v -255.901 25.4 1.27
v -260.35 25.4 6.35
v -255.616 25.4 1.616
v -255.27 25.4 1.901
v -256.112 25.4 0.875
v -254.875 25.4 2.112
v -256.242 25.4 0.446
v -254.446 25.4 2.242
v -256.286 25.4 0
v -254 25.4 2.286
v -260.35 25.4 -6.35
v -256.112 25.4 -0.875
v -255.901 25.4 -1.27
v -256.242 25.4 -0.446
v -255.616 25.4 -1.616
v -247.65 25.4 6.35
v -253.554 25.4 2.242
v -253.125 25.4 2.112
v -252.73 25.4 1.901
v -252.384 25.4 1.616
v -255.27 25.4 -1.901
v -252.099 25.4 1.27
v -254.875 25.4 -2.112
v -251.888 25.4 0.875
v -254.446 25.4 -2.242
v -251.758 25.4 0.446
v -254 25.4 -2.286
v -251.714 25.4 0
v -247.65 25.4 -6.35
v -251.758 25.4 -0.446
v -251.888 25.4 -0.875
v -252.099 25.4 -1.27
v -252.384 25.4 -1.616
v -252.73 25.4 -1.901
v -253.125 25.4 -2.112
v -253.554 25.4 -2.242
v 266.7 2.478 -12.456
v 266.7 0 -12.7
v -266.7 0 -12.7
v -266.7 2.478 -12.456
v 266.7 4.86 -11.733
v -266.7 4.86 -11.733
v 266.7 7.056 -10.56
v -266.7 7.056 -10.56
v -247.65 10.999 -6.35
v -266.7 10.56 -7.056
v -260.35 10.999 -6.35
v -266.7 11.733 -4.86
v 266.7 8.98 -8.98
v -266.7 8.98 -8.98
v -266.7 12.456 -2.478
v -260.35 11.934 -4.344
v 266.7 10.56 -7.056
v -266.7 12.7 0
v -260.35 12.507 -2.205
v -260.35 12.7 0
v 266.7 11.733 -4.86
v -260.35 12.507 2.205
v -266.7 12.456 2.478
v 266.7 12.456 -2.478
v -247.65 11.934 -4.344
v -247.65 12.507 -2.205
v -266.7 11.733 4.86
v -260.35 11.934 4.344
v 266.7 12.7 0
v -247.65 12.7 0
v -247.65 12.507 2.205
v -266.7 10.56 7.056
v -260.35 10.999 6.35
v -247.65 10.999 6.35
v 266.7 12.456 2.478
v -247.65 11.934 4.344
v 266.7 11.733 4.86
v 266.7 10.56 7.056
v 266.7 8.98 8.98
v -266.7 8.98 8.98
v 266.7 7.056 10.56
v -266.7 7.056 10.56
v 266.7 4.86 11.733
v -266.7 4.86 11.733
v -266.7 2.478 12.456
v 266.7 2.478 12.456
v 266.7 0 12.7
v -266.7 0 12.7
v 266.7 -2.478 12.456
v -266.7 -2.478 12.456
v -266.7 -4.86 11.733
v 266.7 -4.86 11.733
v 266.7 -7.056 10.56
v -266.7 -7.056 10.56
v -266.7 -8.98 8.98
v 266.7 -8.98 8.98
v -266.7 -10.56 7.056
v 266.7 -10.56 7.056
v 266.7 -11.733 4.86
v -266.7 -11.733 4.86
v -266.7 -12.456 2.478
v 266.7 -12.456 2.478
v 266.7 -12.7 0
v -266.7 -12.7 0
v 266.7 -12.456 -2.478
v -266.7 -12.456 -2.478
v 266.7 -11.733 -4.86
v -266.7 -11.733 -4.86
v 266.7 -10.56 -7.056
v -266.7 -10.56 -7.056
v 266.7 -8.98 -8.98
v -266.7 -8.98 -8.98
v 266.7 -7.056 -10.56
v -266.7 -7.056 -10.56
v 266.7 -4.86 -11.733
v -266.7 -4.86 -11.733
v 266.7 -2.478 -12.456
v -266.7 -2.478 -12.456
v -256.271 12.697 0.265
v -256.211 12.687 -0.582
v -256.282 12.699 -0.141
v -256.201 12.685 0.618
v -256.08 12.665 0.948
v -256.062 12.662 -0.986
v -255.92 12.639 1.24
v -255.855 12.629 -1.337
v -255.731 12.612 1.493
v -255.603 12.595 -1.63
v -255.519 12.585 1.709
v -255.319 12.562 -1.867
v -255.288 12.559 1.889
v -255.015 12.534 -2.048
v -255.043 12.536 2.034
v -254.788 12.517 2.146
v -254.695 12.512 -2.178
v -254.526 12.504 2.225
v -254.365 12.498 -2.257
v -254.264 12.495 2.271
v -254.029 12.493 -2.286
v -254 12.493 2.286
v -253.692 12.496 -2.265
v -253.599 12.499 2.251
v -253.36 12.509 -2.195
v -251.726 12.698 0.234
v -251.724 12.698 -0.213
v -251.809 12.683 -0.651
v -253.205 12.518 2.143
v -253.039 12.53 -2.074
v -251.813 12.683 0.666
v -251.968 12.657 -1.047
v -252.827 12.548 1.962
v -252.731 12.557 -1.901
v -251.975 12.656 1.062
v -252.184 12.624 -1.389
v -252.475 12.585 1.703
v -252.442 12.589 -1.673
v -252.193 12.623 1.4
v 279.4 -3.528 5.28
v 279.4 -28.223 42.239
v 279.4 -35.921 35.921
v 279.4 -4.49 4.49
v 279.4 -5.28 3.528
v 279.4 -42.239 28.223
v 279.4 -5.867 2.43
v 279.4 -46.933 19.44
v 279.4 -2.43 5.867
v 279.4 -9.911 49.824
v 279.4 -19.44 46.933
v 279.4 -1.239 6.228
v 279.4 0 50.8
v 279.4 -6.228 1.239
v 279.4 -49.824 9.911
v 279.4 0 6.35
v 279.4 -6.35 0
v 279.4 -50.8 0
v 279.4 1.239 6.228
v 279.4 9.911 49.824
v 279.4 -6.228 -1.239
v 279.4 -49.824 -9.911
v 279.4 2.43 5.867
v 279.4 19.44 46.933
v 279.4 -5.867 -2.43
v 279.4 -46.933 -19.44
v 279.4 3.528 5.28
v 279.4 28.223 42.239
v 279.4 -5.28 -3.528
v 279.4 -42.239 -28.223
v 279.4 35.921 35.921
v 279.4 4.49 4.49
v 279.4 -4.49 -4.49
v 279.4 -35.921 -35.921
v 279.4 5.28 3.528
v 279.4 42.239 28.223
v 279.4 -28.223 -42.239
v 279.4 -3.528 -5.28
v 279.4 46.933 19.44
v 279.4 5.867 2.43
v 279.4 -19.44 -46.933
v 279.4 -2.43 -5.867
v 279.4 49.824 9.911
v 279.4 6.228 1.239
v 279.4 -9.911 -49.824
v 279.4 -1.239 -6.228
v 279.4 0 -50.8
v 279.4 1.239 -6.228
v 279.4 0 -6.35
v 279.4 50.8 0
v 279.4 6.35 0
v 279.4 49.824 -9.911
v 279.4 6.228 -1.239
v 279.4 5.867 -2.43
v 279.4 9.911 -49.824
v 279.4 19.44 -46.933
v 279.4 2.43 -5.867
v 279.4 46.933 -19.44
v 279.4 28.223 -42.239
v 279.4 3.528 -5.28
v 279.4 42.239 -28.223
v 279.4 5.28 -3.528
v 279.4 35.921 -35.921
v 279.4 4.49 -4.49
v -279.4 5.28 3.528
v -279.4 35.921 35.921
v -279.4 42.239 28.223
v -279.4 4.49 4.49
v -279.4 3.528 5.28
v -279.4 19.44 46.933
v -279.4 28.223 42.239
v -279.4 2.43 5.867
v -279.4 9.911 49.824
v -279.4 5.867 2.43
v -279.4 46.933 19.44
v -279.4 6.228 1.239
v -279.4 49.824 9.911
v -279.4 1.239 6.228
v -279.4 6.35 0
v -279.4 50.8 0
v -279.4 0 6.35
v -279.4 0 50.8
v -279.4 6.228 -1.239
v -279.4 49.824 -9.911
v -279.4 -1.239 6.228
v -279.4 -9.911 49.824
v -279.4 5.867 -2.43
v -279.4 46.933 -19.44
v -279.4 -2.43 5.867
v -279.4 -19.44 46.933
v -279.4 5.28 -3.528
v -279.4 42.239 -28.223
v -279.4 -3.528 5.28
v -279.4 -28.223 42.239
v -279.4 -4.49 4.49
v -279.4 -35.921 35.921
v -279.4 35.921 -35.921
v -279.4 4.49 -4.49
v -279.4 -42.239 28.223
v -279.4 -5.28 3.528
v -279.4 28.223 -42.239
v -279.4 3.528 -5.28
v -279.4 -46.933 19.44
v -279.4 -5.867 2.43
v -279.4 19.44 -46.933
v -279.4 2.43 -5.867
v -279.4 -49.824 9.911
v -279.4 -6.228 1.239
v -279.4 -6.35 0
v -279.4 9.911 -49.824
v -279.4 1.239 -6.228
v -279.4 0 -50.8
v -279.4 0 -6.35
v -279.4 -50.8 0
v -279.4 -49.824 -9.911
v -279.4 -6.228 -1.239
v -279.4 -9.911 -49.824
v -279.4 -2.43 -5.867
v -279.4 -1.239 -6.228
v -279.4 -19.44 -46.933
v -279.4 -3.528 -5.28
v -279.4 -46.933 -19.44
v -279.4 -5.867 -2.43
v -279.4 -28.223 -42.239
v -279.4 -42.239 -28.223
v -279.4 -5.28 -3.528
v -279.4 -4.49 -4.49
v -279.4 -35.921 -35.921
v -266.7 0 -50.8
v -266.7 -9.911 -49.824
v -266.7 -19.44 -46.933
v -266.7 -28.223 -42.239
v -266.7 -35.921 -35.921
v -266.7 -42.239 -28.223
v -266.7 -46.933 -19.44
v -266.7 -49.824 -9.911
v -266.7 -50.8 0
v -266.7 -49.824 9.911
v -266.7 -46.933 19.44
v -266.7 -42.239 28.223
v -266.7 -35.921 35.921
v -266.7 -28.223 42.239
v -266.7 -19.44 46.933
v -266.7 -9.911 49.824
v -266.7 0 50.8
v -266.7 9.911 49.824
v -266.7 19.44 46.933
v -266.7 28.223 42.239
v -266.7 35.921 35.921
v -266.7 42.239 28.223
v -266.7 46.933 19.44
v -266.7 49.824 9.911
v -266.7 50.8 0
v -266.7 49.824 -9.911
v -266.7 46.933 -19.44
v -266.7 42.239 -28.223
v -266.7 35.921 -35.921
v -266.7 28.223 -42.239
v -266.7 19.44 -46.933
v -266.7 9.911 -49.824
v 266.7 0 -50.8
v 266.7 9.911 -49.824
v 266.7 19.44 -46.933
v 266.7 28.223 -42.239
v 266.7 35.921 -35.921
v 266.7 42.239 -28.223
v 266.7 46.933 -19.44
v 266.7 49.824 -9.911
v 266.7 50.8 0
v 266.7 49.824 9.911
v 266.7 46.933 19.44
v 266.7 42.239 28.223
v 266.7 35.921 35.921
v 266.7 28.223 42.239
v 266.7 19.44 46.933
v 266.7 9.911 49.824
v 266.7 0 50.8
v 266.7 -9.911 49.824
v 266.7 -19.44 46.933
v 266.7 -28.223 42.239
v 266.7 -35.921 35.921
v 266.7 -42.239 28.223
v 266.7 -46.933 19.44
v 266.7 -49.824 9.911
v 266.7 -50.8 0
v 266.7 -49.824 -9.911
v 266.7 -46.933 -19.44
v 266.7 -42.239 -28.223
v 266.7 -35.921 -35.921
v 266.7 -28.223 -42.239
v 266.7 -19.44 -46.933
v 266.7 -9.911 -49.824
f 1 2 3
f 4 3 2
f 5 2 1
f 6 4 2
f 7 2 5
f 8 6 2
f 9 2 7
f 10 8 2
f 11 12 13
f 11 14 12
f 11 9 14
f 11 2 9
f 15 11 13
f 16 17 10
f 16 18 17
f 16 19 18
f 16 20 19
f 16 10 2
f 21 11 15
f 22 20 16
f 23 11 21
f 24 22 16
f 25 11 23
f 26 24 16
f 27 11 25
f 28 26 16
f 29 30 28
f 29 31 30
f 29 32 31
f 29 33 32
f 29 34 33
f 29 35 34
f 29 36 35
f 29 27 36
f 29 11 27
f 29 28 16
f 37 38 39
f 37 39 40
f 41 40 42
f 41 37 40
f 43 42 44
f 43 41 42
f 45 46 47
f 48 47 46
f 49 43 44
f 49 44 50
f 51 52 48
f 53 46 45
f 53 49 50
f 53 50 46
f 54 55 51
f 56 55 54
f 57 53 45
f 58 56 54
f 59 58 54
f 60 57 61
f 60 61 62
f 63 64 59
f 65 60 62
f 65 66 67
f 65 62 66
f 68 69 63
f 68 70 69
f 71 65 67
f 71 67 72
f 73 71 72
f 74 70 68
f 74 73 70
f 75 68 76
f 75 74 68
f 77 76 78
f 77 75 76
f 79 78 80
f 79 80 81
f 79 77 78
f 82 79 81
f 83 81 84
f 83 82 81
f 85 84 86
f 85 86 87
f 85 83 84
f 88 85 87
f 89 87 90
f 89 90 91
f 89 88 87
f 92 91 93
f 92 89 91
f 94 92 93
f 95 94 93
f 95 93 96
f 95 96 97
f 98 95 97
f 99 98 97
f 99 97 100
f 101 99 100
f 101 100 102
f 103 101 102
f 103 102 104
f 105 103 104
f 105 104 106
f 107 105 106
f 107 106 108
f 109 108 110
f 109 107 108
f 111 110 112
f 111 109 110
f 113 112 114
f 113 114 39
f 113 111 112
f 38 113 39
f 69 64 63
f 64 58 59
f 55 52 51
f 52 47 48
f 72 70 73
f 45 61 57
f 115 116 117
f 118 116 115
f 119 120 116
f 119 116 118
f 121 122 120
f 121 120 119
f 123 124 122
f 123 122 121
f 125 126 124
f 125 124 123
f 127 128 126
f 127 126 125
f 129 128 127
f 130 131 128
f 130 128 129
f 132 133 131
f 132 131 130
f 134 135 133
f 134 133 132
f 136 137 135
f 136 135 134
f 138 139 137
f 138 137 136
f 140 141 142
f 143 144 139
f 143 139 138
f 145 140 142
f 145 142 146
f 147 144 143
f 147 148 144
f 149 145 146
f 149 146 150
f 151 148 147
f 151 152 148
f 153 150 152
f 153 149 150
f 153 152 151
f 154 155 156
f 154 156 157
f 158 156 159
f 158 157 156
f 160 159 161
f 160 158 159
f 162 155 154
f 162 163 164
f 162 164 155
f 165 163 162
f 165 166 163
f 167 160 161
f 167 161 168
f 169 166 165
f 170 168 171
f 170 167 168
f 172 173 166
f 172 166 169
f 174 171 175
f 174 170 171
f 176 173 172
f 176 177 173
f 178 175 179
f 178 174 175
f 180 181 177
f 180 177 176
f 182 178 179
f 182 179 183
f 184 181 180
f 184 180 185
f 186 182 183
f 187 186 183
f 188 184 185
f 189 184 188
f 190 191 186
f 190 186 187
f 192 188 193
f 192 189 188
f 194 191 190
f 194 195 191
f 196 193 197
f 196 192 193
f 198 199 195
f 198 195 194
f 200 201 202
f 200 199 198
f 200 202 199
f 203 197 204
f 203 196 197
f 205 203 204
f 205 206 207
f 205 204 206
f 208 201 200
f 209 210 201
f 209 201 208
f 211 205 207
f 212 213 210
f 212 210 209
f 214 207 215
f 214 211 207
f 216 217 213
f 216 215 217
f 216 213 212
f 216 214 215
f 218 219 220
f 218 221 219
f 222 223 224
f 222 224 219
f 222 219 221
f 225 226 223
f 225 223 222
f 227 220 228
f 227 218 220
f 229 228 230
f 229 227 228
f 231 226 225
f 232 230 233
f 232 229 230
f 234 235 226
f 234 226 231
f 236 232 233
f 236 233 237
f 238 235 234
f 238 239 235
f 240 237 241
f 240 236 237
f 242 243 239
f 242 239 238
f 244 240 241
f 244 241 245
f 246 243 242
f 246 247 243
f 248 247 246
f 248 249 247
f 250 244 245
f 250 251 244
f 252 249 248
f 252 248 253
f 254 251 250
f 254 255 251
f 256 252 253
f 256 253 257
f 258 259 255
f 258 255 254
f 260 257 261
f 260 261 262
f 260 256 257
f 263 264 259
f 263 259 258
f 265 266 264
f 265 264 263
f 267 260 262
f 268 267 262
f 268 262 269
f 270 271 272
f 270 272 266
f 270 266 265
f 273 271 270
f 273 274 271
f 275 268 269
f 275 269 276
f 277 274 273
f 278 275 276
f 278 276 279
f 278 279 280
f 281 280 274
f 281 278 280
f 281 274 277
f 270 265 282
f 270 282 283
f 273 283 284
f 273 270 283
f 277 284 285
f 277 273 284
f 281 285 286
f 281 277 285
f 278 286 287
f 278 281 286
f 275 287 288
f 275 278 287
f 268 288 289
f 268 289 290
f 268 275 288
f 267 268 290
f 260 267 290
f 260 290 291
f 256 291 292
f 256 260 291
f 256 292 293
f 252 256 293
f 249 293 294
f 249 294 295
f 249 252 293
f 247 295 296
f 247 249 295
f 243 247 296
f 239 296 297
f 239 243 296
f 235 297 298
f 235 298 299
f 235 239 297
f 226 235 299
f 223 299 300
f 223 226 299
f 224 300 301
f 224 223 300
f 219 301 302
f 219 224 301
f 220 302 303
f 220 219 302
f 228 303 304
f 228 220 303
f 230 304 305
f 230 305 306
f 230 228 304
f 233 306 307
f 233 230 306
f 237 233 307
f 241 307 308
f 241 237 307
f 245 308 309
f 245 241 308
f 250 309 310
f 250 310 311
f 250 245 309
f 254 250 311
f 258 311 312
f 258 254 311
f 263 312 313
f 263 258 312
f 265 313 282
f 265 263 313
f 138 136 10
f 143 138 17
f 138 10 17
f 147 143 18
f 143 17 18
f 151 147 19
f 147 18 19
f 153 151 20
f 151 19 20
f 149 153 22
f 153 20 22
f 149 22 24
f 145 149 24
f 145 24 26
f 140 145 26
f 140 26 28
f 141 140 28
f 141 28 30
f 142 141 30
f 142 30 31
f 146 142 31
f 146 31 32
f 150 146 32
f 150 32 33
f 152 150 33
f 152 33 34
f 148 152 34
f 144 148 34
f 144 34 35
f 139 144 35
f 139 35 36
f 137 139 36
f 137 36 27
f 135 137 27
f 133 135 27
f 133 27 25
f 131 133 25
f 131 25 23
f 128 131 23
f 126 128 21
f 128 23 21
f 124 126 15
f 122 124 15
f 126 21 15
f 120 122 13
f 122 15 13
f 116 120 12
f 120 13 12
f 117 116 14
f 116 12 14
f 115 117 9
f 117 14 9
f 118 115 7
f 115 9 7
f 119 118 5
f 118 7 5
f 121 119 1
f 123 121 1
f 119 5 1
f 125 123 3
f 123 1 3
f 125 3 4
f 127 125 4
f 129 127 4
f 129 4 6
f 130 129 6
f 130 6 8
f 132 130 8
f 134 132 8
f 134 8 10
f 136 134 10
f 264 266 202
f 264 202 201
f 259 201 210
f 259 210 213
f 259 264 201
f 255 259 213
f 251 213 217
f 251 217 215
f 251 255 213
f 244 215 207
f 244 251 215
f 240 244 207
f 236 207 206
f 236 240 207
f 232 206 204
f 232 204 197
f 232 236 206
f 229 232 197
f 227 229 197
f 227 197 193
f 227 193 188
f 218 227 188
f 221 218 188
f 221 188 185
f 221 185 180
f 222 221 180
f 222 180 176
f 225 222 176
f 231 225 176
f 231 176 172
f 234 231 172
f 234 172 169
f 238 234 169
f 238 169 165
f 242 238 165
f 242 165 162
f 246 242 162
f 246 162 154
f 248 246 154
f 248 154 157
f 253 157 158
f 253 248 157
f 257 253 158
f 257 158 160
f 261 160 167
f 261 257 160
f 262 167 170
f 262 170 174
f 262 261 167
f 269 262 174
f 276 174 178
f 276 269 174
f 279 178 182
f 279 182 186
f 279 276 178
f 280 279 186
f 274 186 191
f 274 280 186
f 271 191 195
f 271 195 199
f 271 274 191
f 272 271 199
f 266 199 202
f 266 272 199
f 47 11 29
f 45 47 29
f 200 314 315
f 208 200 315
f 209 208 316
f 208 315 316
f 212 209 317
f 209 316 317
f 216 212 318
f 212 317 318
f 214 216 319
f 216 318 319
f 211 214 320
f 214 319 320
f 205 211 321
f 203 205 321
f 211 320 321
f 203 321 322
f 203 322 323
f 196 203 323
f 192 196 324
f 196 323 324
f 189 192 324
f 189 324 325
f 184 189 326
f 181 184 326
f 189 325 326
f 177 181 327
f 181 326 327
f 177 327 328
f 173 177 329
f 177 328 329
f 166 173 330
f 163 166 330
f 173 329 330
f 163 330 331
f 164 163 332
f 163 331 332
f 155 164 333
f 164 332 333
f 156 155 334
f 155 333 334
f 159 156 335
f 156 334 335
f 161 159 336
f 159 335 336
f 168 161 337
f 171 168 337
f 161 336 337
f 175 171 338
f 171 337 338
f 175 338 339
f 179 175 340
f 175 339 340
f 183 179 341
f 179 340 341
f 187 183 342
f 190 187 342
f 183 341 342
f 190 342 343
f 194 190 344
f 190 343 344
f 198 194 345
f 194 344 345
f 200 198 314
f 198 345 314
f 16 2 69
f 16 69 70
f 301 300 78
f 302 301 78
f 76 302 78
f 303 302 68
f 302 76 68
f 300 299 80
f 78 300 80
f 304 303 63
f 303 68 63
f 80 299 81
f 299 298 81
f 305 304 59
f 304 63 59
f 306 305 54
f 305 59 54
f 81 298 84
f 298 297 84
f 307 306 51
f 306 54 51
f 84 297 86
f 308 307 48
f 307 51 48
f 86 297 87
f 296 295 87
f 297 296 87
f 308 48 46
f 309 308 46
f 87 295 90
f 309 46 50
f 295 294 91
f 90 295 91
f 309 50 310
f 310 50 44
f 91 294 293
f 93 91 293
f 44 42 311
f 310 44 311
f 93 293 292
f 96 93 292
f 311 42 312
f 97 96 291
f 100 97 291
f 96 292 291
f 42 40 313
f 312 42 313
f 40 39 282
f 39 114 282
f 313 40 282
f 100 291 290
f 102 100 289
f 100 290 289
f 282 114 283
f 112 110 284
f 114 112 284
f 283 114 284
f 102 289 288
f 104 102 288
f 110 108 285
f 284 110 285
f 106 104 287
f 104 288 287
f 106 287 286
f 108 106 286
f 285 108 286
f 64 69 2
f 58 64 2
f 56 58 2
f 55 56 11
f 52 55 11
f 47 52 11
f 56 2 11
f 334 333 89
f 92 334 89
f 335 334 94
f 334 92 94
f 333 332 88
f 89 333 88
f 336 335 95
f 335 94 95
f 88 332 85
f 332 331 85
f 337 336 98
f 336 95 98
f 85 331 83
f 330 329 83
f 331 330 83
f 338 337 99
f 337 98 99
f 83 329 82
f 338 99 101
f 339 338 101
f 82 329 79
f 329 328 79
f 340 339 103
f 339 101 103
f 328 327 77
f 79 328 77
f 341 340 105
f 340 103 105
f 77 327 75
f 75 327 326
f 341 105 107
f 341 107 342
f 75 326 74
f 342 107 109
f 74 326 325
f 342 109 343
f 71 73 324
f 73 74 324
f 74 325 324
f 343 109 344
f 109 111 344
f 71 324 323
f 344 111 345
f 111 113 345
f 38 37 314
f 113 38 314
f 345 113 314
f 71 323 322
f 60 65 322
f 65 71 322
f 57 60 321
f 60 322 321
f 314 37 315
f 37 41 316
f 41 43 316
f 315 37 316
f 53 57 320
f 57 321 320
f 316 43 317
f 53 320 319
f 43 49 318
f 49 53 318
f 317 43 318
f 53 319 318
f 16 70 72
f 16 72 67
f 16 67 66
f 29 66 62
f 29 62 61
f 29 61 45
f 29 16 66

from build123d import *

# Parameters (mm, degrees)
SKETCH1_R                = 12.7
SKETCH1_R_2              = 6.35
BOSS_EXTRUDE1_DEPTH      = 279.4
BOSS_EXTRUDE2_START      = -12.7
SKETCH2_R                = 50.8
SKETCH2_R_2              = 6.35
BOSS_EXTRUDE2_DEPTH      = 12.7
SKETCH3_R                = 50.8
SKETCH3_R_2              = 6.35
BOSS_EXTRUDE3_DEPTH      = 12.7
BOSS_EXTRUDE4_REACH      = 315.889
BOSS_EXTRUDE4_END_RADIUS = 12.7
BOSS_EXTRUDE4_START      = 25.4
SKETCH4_W                = 12.7
SKETCH4_H                = 12.7
SKETCH4_R                = 2.286


with BuildPart() as part:
    # Sketch1 → Boss-Extrude1 (new, symmetric)
    with BuildSketch(Plane(origin=(0, 0, 0), x_dir=(0, 0, -1), z_dir=(1, 0, 0))):
        Circle(SKETCH1_R)
        Circle(SKETCH1_R_2, mode=Mode.SUBTRACT)
    extrude(amount=BOSS_EXTRUDE1_DEPTH, both=True)

    # Sketch2 → Boss-Extrude2 (add)
    with BuildSketch(Plane(origin=(279.4, 0, 0), x_dir=(0, 0, -1), z_dir=(1, 0, 0)).offset(BOSS_EXTRUDE2_START)):
        Circle(SKETCH2_R)
        Circle(SKETCH2_R_2, mode=Mode.SUBTRACT)
    extrude(amount=BOSS_EXTRUDE2_DEPTH)

    # Sketch3 → Boss-Extrude3 (add)
    with BuildSketch(Plane.ZY.offset(279.4)):
        with Locations(Location((0, 0, 0), (0, 0, 180))):
            Circle(SKETCH3_R)
        with Locations(Location((0, 0, 0), (0, 0, 180))):
            Circle(SKETCH3_R_2, mode=Mode.SUBTRACT)
    extrude(amount=-BOSS_EXTRUDE3_DEPTH)

    # Boss-Extrude4: up to this cylinder (the profile starts outside it)
    boss_extrude4_end = Plane(origin=(-254, 0, 0), z_dir=(-1, 0, 0)) * Cylinder(BOSS_EXTRUDE4_END_RADIUS, 658.178, mode=Mode.PRIVATE)
    # Sketch4 → Boss-Extrude4 (add, up to the surface)
    with BuildSketch(Plane(origin=(0, 0, 0), x_dir=(1, 0, 0), z_dir=(0, 1, 0)).offset(BOSS_EXTRUDE4_START), mode=Mode.PRIVATE) as boss_extrude4_sk1:
        with Locations((-254, 0)):
            Rectangle(SKETCH4_W, SKETCH4_H)
        with Locations(Location((-254, 0, 0), (0, 0, 270))):
            Circle(SKETCH4_R, mode=Mode.SUBTRACT)
    boss_extrude4_tool1 = extrude(boss_extrude4_sk1.sketch, amount=-BOSS_EXTRUDE4_REACH, mode=Mode.PRIVATE) - boss_extrude4_end
    add(boss_extrude4_tool1.solids().sort_by_distance((-254, 25.4, 6.170395))[0])


solid = part.part
